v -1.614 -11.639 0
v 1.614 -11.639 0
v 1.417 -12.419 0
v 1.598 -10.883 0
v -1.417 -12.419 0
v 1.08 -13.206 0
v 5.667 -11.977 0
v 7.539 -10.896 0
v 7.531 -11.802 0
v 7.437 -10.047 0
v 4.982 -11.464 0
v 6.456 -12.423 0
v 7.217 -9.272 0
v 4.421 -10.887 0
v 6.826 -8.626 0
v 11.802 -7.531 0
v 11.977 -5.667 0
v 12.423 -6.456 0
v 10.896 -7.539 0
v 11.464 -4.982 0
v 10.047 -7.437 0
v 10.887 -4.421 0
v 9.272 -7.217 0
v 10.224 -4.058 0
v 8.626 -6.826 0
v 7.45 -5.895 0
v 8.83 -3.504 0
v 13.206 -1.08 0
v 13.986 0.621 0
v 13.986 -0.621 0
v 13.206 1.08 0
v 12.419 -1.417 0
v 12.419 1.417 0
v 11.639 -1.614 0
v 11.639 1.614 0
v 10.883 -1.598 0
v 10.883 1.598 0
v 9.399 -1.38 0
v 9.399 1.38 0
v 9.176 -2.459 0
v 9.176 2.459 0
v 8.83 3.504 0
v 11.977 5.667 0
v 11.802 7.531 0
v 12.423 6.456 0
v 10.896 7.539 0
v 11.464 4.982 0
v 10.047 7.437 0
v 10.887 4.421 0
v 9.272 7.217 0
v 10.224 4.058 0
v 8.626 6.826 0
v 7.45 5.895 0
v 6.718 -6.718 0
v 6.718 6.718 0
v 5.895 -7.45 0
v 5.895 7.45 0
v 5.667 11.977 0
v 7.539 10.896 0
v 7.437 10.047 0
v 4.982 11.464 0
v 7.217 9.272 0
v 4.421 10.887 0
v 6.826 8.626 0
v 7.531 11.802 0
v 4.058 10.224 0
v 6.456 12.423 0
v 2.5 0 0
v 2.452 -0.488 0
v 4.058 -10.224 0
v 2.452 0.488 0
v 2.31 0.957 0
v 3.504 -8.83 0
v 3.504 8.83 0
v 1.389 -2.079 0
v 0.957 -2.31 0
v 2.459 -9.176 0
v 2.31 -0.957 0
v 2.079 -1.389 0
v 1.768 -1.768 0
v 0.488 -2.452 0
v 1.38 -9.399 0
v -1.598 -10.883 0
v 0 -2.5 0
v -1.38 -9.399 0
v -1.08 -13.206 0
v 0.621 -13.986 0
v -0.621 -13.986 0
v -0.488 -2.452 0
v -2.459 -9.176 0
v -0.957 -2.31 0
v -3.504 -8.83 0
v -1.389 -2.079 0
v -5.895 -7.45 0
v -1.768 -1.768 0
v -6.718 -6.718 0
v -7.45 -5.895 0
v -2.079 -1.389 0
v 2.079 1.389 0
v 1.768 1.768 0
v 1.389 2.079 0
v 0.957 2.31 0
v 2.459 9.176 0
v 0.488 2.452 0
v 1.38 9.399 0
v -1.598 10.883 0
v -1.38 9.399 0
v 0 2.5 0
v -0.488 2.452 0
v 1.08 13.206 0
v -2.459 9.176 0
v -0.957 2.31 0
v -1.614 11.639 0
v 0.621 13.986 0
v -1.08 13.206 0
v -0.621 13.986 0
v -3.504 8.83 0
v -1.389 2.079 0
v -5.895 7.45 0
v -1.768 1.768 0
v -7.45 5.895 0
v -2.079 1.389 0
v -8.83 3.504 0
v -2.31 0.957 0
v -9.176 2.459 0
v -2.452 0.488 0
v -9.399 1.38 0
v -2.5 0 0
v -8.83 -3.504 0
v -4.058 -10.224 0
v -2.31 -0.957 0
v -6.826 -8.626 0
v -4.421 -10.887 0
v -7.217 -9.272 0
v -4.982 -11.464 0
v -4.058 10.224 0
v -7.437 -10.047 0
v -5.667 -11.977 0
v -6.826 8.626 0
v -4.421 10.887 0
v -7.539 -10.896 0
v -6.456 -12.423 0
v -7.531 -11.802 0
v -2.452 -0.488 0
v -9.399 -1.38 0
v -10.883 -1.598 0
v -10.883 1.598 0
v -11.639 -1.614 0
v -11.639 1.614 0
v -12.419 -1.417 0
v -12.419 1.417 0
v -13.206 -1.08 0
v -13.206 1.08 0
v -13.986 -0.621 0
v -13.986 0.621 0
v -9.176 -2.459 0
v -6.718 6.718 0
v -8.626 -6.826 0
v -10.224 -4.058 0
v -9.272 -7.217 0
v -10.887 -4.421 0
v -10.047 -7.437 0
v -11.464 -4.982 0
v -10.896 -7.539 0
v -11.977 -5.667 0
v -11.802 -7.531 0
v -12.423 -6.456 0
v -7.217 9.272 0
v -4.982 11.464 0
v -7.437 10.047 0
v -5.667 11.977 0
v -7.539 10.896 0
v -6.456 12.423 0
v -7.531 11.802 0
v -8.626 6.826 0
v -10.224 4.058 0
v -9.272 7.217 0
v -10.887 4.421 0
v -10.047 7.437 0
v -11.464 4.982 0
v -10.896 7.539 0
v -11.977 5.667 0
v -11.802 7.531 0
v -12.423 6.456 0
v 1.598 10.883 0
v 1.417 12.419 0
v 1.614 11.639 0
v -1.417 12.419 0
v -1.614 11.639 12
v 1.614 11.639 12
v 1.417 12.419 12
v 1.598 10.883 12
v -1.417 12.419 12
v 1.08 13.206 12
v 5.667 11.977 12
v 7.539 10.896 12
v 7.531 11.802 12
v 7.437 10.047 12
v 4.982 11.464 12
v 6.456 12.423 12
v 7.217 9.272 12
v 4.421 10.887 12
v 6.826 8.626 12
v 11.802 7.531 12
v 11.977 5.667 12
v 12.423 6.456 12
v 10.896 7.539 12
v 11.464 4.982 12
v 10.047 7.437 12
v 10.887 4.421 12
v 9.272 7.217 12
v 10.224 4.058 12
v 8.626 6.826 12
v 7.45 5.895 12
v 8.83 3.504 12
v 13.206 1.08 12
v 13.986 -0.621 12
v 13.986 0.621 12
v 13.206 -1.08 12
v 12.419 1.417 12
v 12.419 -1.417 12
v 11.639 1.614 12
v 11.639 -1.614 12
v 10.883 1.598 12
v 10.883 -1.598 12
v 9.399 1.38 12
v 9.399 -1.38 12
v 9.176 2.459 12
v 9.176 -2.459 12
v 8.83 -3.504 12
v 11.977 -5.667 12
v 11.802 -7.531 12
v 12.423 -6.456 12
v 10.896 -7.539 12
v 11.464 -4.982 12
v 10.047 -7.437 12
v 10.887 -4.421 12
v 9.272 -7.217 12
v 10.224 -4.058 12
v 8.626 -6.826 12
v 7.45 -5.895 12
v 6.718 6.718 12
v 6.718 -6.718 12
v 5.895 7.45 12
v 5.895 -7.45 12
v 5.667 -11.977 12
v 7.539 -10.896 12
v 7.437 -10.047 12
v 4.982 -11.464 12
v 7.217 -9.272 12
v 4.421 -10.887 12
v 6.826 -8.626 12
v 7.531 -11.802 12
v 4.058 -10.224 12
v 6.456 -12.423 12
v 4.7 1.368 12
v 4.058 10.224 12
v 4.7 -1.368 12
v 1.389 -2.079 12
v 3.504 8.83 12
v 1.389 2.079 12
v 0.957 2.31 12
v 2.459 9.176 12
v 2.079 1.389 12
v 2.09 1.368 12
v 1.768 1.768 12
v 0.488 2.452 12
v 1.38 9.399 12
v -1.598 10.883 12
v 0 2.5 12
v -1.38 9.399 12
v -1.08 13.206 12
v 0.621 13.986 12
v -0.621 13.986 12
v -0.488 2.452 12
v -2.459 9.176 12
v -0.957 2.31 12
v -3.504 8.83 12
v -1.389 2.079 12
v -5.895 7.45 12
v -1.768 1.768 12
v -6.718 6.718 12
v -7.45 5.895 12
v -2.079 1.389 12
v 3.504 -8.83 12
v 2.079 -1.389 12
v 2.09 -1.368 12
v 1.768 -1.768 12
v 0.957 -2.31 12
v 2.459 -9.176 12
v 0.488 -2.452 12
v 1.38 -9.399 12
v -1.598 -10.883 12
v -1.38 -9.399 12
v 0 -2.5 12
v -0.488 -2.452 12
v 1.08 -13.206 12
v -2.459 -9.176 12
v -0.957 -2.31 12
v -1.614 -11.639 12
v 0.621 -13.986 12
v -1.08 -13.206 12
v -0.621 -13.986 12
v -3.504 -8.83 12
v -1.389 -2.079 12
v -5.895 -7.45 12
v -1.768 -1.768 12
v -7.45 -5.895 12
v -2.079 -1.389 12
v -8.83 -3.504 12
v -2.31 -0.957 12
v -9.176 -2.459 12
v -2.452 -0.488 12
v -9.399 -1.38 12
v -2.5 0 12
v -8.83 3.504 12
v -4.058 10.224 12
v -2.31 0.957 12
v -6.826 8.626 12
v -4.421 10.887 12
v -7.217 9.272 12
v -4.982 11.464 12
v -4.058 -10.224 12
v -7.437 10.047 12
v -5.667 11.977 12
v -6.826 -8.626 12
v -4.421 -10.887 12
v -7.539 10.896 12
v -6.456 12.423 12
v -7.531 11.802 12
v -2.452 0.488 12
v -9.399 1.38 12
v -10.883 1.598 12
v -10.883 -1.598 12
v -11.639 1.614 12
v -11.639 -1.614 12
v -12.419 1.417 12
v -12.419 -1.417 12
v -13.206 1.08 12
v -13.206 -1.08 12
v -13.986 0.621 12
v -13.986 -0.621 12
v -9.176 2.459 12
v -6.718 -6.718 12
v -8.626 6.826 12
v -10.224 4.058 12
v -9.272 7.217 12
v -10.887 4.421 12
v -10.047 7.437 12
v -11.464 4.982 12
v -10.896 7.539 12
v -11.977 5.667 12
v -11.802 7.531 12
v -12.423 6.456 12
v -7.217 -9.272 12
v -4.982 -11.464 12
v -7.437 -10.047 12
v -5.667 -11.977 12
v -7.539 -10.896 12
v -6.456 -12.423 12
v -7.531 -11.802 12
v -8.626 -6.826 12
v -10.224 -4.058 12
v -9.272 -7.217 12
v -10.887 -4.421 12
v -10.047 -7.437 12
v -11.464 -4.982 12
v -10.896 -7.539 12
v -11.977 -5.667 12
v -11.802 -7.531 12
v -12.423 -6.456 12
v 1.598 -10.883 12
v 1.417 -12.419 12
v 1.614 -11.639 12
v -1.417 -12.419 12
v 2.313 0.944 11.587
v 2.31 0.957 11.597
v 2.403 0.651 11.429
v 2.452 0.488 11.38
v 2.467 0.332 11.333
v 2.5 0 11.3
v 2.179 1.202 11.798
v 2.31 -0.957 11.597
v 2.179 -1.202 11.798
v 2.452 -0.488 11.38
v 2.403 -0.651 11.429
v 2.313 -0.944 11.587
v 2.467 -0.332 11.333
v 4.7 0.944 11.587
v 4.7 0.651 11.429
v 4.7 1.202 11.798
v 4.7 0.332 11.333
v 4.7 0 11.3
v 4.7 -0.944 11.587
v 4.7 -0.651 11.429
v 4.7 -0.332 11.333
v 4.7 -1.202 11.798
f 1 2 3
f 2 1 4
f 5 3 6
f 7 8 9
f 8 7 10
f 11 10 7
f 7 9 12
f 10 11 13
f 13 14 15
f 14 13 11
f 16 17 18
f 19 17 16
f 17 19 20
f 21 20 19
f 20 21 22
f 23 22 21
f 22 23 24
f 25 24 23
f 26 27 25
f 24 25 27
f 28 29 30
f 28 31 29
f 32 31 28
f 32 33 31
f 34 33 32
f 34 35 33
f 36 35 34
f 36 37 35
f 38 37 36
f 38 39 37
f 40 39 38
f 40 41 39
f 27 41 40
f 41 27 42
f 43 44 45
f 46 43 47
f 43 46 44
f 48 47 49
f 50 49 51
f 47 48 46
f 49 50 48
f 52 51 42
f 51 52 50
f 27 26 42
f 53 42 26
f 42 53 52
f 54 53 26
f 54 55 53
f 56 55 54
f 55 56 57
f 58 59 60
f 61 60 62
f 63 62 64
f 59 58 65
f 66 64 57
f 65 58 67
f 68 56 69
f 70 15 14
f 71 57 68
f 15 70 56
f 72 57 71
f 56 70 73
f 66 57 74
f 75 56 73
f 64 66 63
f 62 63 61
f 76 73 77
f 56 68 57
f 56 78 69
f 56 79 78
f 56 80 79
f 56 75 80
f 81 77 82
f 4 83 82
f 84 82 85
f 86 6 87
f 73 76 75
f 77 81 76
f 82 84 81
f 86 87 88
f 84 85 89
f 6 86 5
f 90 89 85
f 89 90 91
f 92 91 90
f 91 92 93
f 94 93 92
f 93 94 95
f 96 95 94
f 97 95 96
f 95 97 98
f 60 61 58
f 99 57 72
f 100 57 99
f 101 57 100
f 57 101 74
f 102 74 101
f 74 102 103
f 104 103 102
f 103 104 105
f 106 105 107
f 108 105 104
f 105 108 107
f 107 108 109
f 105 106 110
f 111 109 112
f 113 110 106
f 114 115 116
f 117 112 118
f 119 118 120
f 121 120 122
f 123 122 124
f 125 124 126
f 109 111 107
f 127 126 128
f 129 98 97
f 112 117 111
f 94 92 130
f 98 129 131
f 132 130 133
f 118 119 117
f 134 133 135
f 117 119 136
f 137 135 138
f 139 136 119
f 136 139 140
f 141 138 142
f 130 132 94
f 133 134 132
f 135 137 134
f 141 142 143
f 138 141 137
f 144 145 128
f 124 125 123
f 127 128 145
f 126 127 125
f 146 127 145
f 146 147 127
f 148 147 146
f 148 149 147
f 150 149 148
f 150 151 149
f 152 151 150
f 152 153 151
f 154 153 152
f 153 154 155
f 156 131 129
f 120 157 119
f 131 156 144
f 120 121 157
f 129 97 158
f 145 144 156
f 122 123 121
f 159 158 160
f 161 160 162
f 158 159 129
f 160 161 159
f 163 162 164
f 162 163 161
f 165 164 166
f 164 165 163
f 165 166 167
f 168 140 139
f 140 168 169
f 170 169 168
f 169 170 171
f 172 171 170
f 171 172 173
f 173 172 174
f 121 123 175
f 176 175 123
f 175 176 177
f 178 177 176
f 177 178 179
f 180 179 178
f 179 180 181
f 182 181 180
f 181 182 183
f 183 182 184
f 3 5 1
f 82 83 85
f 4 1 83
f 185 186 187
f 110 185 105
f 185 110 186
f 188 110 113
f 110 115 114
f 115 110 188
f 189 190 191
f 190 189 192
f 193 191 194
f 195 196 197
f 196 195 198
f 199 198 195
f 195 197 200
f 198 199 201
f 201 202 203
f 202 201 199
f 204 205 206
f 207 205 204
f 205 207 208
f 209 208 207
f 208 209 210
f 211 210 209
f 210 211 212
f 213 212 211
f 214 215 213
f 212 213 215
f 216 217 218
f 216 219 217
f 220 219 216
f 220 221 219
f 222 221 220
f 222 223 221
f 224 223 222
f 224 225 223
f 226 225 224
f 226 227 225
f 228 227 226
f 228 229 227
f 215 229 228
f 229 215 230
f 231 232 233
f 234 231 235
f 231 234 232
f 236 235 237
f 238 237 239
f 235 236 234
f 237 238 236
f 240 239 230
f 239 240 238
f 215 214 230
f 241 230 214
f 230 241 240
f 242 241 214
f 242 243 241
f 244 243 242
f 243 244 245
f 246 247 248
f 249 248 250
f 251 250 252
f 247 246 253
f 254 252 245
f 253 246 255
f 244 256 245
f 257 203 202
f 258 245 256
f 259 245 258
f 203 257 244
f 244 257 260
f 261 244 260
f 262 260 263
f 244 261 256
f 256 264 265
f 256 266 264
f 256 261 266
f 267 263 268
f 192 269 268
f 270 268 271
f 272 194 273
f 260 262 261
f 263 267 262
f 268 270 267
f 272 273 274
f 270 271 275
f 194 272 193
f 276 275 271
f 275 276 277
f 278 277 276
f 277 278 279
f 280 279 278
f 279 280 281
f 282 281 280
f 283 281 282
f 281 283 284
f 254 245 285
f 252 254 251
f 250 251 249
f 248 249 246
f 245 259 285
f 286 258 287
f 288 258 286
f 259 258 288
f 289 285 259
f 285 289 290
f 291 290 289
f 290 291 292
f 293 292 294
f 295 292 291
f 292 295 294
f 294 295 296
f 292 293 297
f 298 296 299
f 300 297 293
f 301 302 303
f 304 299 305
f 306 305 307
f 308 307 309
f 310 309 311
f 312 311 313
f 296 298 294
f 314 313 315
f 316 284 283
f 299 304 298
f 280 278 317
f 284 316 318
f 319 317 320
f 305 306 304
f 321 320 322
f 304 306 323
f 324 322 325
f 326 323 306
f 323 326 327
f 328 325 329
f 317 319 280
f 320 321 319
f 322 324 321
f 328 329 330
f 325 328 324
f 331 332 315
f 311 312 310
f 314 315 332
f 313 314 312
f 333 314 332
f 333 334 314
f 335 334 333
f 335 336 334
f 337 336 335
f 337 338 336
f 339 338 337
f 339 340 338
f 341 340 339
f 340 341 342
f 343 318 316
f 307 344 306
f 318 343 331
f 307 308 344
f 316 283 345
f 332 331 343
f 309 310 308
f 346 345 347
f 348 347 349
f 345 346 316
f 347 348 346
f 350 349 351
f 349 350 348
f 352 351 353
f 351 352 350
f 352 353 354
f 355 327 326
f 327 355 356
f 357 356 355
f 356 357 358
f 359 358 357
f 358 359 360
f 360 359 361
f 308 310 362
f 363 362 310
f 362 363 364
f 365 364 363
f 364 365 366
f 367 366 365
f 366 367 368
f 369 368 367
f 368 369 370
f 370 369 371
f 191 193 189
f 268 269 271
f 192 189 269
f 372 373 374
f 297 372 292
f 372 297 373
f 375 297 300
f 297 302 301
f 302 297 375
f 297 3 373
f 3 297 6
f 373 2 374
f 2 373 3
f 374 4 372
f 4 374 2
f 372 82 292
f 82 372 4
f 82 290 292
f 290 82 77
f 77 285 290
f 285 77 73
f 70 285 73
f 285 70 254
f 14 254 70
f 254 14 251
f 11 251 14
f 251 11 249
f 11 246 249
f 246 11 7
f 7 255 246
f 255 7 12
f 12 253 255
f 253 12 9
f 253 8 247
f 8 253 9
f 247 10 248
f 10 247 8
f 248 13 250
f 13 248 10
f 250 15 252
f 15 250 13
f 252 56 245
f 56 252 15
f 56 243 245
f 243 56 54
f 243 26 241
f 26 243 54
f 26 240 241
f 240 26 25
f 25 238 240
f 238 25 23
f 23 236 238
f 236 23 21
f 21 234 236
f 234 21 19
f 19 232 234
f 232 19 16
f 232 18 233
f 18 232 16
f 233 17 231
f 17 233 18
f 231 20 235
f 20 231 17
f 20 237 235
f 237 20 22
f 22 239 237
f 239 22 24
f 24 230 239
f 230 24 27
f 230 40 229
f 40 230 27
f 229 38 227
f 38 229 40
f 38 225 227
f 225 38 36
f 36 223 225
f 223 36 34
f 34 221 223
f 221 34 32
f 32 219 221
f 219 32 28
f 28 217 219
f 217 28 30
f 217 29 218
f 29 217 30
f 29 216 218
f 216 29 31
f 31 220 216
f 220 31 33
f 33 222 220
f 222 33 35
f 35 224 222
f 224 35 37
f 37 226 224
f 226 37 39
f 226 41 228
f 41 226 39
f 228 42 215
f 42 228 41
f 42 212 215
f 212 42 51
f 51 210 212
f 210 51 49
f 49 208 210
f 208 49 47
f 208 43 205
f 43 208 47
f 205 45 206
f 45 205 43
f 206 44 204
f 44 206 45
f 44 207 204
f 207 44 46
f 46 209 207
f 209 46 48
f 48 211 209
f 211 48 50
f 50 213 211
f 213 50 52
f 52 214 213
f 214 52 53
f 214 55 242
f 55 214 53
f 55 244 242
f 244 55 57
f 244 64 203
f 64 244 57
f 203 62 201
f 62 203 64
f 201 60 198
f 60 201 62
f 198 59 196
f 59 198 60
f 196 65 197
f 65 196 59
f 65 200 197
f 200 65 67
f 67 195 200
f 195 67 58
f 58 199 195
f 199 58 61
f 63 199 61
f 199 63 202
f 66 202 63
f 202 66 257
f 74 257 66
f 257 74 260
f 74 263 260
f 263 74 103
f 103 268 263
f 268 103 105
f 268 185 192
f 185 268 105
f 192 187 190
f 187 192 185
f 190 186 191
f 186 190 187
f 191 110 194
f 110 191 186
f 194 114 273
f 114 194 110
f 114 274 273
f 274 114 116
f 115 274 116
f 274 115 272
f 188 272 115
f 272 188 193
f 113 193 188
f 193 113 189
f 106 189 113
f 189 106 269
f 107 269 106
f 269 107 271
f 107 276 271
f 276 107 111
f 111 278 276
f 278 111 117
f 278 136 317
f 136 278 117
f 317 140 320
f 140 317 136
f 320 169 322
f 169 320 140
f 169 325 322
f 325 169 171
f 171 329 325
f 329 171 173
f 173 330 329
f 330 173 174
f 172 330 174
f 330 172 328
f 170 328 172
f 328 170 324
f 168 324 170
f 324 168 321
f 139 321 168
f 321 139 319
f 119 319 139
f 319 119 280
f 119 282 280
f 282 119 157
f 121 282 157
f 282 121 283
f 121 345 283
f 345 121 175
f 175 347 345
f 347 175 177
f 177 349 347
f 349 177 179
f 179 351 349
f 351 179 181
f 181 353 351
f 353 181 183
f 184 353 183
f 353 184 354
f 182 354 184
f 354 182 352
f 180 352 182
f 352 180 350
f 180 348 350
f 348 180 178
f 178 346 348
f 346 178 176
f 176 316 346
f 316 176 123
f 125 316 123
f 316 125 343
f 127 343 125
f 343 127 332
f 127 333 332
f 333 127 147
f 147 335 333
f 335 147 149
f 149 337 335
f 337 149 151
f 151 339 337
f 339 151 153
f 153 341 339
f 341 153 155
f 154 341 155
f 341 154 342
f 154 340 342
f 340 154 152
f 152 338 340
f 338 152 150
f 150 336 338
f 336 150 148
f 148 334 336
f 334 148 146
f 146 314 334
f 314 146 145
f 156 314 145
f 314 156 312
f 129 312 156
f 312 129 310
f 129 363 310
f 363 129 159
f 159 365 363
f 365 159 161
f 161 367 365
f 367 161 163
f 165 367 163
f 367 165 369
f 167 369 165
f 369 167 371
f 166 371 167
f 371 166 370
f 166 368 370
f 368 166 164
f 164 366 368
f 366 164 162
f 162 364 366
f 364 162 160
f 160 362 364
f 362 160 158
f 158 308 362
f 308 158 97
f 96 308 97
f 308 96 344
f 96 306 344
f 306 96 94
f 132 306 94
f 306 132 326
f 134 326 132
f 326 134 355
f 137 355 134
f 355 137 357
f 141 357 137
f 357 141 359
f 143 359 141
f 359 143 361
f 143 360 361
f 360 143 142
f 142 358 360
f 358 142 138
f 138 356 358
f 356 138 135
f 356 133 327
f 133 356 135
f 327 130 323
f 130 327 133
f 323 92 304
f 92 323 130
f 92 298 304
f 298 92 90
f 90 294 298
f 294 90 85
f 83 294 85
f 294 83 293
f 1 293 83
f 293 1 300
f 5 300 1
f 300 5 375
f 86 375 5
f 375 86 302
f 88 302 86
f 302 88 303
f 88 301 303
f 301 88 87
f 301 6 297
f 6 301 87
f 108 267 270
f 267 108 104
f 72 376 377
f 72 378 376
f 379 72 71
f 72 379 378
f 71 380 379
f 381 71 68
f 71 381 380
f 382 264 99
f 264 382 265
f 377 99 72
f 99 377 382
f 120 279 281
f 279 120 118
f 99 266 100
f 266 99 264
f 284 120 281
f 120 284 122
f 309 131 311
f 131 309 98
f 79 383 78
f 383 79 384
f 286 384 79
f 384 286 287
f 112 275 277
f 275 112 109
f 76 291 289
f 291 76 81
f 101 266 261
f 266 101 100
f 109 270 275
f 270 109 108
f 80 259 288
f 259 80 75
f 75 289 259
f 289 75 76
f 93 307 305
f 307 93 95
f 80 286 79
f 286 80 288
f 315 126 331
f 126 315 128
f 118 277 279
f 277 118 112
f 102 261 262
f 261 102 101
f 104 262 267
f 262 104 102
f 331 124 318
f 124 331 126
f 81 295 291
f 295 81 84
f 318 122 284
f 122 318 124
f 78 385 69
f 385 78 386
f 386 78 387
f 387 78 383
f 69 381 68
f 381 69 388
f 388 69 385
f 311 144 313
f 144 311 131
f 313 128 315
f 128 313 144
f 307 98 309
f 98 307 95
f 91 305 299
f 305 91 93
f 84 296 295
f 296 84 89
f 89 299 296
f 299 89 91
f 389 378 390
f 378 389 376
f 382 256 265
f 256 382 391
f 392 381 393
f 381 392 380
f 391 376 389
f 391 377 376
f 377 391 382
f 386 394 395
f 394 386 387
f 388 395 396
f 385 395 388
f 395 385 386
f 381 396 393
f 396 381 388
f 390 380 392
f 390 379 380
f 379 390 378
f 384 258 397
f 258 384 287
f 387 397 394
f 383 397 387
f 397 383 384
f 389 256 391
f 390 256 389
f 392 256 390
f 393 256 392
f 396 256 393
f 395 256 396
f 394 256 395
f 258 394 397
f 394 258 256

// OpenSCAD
$fn = 32;

// ----------------------------------------------------------------------
// Spur gear: m=2 z=12, 28 mm tip diameter x 12 mm
// ----------------------------------------------------------------------

// --- parameters (mm) ---
modul = 2;                // module
n_teeth = 12;             // number of teeth
width = 12;               // face width
pa = 20;                  // pressure angle, deg
shaft_d = 5;              // shaft bore
set_d = 3.4;              // set screw tap hole
set_z = 13;               // set screw height

/* --- involute profile --- */
pitch_r = modul * n_teeth / 2;
base_r = pitch_r * cos(pa);
tip_r = pitch_r + modul;
root_r = pitch_r - 1.25 * modul;
flank_steps = 6;

function inv_deg(a) = (tan(a) - a * PI / 180) * 180 / PI;
function flank_r(i) = root_r + (tip_r - root_r) * i / flank_steps;
function half_angle(r) = 90 / n_teeth + inv_deg(pa) - inv_deg(acos(min(1, base_r / r)));
function tooth_pt(k, i, side) =
    let (r = flank_r(i), a = k * 360 / n_teeth + side * half_angle(r))
    [r * cos(a), r * sin(a)];

module tooth_profile() {
  polygon(points = [
    for (k = [0 : n_teeth - 1])
      each [
        for (i = [0 : flank_steps]) tooth_pt(k, i, -1),
        for (i = [flank_steps : -1 : 0]) tooth_pt(k, i, 1),
        let (ta = (k + 0.5) * 360 / n_teeth)
          [root_r * cos(ta), root_r * sin(ta)]
      ]
  ]);
}

module gear_disc() {
  linear_extrude(height = width) tooth_profile();
}

difference() {
  gear_disc();
  translate([0, 0, -1]) cylinder(h = width + 3, d = shaft_d);
  /* set screw, drilled radially */
  translate([-1, 0, set_z]) rotate([0, 90, 0]) cylinder(h = (root_r * 0.6), d = set_d);
}
